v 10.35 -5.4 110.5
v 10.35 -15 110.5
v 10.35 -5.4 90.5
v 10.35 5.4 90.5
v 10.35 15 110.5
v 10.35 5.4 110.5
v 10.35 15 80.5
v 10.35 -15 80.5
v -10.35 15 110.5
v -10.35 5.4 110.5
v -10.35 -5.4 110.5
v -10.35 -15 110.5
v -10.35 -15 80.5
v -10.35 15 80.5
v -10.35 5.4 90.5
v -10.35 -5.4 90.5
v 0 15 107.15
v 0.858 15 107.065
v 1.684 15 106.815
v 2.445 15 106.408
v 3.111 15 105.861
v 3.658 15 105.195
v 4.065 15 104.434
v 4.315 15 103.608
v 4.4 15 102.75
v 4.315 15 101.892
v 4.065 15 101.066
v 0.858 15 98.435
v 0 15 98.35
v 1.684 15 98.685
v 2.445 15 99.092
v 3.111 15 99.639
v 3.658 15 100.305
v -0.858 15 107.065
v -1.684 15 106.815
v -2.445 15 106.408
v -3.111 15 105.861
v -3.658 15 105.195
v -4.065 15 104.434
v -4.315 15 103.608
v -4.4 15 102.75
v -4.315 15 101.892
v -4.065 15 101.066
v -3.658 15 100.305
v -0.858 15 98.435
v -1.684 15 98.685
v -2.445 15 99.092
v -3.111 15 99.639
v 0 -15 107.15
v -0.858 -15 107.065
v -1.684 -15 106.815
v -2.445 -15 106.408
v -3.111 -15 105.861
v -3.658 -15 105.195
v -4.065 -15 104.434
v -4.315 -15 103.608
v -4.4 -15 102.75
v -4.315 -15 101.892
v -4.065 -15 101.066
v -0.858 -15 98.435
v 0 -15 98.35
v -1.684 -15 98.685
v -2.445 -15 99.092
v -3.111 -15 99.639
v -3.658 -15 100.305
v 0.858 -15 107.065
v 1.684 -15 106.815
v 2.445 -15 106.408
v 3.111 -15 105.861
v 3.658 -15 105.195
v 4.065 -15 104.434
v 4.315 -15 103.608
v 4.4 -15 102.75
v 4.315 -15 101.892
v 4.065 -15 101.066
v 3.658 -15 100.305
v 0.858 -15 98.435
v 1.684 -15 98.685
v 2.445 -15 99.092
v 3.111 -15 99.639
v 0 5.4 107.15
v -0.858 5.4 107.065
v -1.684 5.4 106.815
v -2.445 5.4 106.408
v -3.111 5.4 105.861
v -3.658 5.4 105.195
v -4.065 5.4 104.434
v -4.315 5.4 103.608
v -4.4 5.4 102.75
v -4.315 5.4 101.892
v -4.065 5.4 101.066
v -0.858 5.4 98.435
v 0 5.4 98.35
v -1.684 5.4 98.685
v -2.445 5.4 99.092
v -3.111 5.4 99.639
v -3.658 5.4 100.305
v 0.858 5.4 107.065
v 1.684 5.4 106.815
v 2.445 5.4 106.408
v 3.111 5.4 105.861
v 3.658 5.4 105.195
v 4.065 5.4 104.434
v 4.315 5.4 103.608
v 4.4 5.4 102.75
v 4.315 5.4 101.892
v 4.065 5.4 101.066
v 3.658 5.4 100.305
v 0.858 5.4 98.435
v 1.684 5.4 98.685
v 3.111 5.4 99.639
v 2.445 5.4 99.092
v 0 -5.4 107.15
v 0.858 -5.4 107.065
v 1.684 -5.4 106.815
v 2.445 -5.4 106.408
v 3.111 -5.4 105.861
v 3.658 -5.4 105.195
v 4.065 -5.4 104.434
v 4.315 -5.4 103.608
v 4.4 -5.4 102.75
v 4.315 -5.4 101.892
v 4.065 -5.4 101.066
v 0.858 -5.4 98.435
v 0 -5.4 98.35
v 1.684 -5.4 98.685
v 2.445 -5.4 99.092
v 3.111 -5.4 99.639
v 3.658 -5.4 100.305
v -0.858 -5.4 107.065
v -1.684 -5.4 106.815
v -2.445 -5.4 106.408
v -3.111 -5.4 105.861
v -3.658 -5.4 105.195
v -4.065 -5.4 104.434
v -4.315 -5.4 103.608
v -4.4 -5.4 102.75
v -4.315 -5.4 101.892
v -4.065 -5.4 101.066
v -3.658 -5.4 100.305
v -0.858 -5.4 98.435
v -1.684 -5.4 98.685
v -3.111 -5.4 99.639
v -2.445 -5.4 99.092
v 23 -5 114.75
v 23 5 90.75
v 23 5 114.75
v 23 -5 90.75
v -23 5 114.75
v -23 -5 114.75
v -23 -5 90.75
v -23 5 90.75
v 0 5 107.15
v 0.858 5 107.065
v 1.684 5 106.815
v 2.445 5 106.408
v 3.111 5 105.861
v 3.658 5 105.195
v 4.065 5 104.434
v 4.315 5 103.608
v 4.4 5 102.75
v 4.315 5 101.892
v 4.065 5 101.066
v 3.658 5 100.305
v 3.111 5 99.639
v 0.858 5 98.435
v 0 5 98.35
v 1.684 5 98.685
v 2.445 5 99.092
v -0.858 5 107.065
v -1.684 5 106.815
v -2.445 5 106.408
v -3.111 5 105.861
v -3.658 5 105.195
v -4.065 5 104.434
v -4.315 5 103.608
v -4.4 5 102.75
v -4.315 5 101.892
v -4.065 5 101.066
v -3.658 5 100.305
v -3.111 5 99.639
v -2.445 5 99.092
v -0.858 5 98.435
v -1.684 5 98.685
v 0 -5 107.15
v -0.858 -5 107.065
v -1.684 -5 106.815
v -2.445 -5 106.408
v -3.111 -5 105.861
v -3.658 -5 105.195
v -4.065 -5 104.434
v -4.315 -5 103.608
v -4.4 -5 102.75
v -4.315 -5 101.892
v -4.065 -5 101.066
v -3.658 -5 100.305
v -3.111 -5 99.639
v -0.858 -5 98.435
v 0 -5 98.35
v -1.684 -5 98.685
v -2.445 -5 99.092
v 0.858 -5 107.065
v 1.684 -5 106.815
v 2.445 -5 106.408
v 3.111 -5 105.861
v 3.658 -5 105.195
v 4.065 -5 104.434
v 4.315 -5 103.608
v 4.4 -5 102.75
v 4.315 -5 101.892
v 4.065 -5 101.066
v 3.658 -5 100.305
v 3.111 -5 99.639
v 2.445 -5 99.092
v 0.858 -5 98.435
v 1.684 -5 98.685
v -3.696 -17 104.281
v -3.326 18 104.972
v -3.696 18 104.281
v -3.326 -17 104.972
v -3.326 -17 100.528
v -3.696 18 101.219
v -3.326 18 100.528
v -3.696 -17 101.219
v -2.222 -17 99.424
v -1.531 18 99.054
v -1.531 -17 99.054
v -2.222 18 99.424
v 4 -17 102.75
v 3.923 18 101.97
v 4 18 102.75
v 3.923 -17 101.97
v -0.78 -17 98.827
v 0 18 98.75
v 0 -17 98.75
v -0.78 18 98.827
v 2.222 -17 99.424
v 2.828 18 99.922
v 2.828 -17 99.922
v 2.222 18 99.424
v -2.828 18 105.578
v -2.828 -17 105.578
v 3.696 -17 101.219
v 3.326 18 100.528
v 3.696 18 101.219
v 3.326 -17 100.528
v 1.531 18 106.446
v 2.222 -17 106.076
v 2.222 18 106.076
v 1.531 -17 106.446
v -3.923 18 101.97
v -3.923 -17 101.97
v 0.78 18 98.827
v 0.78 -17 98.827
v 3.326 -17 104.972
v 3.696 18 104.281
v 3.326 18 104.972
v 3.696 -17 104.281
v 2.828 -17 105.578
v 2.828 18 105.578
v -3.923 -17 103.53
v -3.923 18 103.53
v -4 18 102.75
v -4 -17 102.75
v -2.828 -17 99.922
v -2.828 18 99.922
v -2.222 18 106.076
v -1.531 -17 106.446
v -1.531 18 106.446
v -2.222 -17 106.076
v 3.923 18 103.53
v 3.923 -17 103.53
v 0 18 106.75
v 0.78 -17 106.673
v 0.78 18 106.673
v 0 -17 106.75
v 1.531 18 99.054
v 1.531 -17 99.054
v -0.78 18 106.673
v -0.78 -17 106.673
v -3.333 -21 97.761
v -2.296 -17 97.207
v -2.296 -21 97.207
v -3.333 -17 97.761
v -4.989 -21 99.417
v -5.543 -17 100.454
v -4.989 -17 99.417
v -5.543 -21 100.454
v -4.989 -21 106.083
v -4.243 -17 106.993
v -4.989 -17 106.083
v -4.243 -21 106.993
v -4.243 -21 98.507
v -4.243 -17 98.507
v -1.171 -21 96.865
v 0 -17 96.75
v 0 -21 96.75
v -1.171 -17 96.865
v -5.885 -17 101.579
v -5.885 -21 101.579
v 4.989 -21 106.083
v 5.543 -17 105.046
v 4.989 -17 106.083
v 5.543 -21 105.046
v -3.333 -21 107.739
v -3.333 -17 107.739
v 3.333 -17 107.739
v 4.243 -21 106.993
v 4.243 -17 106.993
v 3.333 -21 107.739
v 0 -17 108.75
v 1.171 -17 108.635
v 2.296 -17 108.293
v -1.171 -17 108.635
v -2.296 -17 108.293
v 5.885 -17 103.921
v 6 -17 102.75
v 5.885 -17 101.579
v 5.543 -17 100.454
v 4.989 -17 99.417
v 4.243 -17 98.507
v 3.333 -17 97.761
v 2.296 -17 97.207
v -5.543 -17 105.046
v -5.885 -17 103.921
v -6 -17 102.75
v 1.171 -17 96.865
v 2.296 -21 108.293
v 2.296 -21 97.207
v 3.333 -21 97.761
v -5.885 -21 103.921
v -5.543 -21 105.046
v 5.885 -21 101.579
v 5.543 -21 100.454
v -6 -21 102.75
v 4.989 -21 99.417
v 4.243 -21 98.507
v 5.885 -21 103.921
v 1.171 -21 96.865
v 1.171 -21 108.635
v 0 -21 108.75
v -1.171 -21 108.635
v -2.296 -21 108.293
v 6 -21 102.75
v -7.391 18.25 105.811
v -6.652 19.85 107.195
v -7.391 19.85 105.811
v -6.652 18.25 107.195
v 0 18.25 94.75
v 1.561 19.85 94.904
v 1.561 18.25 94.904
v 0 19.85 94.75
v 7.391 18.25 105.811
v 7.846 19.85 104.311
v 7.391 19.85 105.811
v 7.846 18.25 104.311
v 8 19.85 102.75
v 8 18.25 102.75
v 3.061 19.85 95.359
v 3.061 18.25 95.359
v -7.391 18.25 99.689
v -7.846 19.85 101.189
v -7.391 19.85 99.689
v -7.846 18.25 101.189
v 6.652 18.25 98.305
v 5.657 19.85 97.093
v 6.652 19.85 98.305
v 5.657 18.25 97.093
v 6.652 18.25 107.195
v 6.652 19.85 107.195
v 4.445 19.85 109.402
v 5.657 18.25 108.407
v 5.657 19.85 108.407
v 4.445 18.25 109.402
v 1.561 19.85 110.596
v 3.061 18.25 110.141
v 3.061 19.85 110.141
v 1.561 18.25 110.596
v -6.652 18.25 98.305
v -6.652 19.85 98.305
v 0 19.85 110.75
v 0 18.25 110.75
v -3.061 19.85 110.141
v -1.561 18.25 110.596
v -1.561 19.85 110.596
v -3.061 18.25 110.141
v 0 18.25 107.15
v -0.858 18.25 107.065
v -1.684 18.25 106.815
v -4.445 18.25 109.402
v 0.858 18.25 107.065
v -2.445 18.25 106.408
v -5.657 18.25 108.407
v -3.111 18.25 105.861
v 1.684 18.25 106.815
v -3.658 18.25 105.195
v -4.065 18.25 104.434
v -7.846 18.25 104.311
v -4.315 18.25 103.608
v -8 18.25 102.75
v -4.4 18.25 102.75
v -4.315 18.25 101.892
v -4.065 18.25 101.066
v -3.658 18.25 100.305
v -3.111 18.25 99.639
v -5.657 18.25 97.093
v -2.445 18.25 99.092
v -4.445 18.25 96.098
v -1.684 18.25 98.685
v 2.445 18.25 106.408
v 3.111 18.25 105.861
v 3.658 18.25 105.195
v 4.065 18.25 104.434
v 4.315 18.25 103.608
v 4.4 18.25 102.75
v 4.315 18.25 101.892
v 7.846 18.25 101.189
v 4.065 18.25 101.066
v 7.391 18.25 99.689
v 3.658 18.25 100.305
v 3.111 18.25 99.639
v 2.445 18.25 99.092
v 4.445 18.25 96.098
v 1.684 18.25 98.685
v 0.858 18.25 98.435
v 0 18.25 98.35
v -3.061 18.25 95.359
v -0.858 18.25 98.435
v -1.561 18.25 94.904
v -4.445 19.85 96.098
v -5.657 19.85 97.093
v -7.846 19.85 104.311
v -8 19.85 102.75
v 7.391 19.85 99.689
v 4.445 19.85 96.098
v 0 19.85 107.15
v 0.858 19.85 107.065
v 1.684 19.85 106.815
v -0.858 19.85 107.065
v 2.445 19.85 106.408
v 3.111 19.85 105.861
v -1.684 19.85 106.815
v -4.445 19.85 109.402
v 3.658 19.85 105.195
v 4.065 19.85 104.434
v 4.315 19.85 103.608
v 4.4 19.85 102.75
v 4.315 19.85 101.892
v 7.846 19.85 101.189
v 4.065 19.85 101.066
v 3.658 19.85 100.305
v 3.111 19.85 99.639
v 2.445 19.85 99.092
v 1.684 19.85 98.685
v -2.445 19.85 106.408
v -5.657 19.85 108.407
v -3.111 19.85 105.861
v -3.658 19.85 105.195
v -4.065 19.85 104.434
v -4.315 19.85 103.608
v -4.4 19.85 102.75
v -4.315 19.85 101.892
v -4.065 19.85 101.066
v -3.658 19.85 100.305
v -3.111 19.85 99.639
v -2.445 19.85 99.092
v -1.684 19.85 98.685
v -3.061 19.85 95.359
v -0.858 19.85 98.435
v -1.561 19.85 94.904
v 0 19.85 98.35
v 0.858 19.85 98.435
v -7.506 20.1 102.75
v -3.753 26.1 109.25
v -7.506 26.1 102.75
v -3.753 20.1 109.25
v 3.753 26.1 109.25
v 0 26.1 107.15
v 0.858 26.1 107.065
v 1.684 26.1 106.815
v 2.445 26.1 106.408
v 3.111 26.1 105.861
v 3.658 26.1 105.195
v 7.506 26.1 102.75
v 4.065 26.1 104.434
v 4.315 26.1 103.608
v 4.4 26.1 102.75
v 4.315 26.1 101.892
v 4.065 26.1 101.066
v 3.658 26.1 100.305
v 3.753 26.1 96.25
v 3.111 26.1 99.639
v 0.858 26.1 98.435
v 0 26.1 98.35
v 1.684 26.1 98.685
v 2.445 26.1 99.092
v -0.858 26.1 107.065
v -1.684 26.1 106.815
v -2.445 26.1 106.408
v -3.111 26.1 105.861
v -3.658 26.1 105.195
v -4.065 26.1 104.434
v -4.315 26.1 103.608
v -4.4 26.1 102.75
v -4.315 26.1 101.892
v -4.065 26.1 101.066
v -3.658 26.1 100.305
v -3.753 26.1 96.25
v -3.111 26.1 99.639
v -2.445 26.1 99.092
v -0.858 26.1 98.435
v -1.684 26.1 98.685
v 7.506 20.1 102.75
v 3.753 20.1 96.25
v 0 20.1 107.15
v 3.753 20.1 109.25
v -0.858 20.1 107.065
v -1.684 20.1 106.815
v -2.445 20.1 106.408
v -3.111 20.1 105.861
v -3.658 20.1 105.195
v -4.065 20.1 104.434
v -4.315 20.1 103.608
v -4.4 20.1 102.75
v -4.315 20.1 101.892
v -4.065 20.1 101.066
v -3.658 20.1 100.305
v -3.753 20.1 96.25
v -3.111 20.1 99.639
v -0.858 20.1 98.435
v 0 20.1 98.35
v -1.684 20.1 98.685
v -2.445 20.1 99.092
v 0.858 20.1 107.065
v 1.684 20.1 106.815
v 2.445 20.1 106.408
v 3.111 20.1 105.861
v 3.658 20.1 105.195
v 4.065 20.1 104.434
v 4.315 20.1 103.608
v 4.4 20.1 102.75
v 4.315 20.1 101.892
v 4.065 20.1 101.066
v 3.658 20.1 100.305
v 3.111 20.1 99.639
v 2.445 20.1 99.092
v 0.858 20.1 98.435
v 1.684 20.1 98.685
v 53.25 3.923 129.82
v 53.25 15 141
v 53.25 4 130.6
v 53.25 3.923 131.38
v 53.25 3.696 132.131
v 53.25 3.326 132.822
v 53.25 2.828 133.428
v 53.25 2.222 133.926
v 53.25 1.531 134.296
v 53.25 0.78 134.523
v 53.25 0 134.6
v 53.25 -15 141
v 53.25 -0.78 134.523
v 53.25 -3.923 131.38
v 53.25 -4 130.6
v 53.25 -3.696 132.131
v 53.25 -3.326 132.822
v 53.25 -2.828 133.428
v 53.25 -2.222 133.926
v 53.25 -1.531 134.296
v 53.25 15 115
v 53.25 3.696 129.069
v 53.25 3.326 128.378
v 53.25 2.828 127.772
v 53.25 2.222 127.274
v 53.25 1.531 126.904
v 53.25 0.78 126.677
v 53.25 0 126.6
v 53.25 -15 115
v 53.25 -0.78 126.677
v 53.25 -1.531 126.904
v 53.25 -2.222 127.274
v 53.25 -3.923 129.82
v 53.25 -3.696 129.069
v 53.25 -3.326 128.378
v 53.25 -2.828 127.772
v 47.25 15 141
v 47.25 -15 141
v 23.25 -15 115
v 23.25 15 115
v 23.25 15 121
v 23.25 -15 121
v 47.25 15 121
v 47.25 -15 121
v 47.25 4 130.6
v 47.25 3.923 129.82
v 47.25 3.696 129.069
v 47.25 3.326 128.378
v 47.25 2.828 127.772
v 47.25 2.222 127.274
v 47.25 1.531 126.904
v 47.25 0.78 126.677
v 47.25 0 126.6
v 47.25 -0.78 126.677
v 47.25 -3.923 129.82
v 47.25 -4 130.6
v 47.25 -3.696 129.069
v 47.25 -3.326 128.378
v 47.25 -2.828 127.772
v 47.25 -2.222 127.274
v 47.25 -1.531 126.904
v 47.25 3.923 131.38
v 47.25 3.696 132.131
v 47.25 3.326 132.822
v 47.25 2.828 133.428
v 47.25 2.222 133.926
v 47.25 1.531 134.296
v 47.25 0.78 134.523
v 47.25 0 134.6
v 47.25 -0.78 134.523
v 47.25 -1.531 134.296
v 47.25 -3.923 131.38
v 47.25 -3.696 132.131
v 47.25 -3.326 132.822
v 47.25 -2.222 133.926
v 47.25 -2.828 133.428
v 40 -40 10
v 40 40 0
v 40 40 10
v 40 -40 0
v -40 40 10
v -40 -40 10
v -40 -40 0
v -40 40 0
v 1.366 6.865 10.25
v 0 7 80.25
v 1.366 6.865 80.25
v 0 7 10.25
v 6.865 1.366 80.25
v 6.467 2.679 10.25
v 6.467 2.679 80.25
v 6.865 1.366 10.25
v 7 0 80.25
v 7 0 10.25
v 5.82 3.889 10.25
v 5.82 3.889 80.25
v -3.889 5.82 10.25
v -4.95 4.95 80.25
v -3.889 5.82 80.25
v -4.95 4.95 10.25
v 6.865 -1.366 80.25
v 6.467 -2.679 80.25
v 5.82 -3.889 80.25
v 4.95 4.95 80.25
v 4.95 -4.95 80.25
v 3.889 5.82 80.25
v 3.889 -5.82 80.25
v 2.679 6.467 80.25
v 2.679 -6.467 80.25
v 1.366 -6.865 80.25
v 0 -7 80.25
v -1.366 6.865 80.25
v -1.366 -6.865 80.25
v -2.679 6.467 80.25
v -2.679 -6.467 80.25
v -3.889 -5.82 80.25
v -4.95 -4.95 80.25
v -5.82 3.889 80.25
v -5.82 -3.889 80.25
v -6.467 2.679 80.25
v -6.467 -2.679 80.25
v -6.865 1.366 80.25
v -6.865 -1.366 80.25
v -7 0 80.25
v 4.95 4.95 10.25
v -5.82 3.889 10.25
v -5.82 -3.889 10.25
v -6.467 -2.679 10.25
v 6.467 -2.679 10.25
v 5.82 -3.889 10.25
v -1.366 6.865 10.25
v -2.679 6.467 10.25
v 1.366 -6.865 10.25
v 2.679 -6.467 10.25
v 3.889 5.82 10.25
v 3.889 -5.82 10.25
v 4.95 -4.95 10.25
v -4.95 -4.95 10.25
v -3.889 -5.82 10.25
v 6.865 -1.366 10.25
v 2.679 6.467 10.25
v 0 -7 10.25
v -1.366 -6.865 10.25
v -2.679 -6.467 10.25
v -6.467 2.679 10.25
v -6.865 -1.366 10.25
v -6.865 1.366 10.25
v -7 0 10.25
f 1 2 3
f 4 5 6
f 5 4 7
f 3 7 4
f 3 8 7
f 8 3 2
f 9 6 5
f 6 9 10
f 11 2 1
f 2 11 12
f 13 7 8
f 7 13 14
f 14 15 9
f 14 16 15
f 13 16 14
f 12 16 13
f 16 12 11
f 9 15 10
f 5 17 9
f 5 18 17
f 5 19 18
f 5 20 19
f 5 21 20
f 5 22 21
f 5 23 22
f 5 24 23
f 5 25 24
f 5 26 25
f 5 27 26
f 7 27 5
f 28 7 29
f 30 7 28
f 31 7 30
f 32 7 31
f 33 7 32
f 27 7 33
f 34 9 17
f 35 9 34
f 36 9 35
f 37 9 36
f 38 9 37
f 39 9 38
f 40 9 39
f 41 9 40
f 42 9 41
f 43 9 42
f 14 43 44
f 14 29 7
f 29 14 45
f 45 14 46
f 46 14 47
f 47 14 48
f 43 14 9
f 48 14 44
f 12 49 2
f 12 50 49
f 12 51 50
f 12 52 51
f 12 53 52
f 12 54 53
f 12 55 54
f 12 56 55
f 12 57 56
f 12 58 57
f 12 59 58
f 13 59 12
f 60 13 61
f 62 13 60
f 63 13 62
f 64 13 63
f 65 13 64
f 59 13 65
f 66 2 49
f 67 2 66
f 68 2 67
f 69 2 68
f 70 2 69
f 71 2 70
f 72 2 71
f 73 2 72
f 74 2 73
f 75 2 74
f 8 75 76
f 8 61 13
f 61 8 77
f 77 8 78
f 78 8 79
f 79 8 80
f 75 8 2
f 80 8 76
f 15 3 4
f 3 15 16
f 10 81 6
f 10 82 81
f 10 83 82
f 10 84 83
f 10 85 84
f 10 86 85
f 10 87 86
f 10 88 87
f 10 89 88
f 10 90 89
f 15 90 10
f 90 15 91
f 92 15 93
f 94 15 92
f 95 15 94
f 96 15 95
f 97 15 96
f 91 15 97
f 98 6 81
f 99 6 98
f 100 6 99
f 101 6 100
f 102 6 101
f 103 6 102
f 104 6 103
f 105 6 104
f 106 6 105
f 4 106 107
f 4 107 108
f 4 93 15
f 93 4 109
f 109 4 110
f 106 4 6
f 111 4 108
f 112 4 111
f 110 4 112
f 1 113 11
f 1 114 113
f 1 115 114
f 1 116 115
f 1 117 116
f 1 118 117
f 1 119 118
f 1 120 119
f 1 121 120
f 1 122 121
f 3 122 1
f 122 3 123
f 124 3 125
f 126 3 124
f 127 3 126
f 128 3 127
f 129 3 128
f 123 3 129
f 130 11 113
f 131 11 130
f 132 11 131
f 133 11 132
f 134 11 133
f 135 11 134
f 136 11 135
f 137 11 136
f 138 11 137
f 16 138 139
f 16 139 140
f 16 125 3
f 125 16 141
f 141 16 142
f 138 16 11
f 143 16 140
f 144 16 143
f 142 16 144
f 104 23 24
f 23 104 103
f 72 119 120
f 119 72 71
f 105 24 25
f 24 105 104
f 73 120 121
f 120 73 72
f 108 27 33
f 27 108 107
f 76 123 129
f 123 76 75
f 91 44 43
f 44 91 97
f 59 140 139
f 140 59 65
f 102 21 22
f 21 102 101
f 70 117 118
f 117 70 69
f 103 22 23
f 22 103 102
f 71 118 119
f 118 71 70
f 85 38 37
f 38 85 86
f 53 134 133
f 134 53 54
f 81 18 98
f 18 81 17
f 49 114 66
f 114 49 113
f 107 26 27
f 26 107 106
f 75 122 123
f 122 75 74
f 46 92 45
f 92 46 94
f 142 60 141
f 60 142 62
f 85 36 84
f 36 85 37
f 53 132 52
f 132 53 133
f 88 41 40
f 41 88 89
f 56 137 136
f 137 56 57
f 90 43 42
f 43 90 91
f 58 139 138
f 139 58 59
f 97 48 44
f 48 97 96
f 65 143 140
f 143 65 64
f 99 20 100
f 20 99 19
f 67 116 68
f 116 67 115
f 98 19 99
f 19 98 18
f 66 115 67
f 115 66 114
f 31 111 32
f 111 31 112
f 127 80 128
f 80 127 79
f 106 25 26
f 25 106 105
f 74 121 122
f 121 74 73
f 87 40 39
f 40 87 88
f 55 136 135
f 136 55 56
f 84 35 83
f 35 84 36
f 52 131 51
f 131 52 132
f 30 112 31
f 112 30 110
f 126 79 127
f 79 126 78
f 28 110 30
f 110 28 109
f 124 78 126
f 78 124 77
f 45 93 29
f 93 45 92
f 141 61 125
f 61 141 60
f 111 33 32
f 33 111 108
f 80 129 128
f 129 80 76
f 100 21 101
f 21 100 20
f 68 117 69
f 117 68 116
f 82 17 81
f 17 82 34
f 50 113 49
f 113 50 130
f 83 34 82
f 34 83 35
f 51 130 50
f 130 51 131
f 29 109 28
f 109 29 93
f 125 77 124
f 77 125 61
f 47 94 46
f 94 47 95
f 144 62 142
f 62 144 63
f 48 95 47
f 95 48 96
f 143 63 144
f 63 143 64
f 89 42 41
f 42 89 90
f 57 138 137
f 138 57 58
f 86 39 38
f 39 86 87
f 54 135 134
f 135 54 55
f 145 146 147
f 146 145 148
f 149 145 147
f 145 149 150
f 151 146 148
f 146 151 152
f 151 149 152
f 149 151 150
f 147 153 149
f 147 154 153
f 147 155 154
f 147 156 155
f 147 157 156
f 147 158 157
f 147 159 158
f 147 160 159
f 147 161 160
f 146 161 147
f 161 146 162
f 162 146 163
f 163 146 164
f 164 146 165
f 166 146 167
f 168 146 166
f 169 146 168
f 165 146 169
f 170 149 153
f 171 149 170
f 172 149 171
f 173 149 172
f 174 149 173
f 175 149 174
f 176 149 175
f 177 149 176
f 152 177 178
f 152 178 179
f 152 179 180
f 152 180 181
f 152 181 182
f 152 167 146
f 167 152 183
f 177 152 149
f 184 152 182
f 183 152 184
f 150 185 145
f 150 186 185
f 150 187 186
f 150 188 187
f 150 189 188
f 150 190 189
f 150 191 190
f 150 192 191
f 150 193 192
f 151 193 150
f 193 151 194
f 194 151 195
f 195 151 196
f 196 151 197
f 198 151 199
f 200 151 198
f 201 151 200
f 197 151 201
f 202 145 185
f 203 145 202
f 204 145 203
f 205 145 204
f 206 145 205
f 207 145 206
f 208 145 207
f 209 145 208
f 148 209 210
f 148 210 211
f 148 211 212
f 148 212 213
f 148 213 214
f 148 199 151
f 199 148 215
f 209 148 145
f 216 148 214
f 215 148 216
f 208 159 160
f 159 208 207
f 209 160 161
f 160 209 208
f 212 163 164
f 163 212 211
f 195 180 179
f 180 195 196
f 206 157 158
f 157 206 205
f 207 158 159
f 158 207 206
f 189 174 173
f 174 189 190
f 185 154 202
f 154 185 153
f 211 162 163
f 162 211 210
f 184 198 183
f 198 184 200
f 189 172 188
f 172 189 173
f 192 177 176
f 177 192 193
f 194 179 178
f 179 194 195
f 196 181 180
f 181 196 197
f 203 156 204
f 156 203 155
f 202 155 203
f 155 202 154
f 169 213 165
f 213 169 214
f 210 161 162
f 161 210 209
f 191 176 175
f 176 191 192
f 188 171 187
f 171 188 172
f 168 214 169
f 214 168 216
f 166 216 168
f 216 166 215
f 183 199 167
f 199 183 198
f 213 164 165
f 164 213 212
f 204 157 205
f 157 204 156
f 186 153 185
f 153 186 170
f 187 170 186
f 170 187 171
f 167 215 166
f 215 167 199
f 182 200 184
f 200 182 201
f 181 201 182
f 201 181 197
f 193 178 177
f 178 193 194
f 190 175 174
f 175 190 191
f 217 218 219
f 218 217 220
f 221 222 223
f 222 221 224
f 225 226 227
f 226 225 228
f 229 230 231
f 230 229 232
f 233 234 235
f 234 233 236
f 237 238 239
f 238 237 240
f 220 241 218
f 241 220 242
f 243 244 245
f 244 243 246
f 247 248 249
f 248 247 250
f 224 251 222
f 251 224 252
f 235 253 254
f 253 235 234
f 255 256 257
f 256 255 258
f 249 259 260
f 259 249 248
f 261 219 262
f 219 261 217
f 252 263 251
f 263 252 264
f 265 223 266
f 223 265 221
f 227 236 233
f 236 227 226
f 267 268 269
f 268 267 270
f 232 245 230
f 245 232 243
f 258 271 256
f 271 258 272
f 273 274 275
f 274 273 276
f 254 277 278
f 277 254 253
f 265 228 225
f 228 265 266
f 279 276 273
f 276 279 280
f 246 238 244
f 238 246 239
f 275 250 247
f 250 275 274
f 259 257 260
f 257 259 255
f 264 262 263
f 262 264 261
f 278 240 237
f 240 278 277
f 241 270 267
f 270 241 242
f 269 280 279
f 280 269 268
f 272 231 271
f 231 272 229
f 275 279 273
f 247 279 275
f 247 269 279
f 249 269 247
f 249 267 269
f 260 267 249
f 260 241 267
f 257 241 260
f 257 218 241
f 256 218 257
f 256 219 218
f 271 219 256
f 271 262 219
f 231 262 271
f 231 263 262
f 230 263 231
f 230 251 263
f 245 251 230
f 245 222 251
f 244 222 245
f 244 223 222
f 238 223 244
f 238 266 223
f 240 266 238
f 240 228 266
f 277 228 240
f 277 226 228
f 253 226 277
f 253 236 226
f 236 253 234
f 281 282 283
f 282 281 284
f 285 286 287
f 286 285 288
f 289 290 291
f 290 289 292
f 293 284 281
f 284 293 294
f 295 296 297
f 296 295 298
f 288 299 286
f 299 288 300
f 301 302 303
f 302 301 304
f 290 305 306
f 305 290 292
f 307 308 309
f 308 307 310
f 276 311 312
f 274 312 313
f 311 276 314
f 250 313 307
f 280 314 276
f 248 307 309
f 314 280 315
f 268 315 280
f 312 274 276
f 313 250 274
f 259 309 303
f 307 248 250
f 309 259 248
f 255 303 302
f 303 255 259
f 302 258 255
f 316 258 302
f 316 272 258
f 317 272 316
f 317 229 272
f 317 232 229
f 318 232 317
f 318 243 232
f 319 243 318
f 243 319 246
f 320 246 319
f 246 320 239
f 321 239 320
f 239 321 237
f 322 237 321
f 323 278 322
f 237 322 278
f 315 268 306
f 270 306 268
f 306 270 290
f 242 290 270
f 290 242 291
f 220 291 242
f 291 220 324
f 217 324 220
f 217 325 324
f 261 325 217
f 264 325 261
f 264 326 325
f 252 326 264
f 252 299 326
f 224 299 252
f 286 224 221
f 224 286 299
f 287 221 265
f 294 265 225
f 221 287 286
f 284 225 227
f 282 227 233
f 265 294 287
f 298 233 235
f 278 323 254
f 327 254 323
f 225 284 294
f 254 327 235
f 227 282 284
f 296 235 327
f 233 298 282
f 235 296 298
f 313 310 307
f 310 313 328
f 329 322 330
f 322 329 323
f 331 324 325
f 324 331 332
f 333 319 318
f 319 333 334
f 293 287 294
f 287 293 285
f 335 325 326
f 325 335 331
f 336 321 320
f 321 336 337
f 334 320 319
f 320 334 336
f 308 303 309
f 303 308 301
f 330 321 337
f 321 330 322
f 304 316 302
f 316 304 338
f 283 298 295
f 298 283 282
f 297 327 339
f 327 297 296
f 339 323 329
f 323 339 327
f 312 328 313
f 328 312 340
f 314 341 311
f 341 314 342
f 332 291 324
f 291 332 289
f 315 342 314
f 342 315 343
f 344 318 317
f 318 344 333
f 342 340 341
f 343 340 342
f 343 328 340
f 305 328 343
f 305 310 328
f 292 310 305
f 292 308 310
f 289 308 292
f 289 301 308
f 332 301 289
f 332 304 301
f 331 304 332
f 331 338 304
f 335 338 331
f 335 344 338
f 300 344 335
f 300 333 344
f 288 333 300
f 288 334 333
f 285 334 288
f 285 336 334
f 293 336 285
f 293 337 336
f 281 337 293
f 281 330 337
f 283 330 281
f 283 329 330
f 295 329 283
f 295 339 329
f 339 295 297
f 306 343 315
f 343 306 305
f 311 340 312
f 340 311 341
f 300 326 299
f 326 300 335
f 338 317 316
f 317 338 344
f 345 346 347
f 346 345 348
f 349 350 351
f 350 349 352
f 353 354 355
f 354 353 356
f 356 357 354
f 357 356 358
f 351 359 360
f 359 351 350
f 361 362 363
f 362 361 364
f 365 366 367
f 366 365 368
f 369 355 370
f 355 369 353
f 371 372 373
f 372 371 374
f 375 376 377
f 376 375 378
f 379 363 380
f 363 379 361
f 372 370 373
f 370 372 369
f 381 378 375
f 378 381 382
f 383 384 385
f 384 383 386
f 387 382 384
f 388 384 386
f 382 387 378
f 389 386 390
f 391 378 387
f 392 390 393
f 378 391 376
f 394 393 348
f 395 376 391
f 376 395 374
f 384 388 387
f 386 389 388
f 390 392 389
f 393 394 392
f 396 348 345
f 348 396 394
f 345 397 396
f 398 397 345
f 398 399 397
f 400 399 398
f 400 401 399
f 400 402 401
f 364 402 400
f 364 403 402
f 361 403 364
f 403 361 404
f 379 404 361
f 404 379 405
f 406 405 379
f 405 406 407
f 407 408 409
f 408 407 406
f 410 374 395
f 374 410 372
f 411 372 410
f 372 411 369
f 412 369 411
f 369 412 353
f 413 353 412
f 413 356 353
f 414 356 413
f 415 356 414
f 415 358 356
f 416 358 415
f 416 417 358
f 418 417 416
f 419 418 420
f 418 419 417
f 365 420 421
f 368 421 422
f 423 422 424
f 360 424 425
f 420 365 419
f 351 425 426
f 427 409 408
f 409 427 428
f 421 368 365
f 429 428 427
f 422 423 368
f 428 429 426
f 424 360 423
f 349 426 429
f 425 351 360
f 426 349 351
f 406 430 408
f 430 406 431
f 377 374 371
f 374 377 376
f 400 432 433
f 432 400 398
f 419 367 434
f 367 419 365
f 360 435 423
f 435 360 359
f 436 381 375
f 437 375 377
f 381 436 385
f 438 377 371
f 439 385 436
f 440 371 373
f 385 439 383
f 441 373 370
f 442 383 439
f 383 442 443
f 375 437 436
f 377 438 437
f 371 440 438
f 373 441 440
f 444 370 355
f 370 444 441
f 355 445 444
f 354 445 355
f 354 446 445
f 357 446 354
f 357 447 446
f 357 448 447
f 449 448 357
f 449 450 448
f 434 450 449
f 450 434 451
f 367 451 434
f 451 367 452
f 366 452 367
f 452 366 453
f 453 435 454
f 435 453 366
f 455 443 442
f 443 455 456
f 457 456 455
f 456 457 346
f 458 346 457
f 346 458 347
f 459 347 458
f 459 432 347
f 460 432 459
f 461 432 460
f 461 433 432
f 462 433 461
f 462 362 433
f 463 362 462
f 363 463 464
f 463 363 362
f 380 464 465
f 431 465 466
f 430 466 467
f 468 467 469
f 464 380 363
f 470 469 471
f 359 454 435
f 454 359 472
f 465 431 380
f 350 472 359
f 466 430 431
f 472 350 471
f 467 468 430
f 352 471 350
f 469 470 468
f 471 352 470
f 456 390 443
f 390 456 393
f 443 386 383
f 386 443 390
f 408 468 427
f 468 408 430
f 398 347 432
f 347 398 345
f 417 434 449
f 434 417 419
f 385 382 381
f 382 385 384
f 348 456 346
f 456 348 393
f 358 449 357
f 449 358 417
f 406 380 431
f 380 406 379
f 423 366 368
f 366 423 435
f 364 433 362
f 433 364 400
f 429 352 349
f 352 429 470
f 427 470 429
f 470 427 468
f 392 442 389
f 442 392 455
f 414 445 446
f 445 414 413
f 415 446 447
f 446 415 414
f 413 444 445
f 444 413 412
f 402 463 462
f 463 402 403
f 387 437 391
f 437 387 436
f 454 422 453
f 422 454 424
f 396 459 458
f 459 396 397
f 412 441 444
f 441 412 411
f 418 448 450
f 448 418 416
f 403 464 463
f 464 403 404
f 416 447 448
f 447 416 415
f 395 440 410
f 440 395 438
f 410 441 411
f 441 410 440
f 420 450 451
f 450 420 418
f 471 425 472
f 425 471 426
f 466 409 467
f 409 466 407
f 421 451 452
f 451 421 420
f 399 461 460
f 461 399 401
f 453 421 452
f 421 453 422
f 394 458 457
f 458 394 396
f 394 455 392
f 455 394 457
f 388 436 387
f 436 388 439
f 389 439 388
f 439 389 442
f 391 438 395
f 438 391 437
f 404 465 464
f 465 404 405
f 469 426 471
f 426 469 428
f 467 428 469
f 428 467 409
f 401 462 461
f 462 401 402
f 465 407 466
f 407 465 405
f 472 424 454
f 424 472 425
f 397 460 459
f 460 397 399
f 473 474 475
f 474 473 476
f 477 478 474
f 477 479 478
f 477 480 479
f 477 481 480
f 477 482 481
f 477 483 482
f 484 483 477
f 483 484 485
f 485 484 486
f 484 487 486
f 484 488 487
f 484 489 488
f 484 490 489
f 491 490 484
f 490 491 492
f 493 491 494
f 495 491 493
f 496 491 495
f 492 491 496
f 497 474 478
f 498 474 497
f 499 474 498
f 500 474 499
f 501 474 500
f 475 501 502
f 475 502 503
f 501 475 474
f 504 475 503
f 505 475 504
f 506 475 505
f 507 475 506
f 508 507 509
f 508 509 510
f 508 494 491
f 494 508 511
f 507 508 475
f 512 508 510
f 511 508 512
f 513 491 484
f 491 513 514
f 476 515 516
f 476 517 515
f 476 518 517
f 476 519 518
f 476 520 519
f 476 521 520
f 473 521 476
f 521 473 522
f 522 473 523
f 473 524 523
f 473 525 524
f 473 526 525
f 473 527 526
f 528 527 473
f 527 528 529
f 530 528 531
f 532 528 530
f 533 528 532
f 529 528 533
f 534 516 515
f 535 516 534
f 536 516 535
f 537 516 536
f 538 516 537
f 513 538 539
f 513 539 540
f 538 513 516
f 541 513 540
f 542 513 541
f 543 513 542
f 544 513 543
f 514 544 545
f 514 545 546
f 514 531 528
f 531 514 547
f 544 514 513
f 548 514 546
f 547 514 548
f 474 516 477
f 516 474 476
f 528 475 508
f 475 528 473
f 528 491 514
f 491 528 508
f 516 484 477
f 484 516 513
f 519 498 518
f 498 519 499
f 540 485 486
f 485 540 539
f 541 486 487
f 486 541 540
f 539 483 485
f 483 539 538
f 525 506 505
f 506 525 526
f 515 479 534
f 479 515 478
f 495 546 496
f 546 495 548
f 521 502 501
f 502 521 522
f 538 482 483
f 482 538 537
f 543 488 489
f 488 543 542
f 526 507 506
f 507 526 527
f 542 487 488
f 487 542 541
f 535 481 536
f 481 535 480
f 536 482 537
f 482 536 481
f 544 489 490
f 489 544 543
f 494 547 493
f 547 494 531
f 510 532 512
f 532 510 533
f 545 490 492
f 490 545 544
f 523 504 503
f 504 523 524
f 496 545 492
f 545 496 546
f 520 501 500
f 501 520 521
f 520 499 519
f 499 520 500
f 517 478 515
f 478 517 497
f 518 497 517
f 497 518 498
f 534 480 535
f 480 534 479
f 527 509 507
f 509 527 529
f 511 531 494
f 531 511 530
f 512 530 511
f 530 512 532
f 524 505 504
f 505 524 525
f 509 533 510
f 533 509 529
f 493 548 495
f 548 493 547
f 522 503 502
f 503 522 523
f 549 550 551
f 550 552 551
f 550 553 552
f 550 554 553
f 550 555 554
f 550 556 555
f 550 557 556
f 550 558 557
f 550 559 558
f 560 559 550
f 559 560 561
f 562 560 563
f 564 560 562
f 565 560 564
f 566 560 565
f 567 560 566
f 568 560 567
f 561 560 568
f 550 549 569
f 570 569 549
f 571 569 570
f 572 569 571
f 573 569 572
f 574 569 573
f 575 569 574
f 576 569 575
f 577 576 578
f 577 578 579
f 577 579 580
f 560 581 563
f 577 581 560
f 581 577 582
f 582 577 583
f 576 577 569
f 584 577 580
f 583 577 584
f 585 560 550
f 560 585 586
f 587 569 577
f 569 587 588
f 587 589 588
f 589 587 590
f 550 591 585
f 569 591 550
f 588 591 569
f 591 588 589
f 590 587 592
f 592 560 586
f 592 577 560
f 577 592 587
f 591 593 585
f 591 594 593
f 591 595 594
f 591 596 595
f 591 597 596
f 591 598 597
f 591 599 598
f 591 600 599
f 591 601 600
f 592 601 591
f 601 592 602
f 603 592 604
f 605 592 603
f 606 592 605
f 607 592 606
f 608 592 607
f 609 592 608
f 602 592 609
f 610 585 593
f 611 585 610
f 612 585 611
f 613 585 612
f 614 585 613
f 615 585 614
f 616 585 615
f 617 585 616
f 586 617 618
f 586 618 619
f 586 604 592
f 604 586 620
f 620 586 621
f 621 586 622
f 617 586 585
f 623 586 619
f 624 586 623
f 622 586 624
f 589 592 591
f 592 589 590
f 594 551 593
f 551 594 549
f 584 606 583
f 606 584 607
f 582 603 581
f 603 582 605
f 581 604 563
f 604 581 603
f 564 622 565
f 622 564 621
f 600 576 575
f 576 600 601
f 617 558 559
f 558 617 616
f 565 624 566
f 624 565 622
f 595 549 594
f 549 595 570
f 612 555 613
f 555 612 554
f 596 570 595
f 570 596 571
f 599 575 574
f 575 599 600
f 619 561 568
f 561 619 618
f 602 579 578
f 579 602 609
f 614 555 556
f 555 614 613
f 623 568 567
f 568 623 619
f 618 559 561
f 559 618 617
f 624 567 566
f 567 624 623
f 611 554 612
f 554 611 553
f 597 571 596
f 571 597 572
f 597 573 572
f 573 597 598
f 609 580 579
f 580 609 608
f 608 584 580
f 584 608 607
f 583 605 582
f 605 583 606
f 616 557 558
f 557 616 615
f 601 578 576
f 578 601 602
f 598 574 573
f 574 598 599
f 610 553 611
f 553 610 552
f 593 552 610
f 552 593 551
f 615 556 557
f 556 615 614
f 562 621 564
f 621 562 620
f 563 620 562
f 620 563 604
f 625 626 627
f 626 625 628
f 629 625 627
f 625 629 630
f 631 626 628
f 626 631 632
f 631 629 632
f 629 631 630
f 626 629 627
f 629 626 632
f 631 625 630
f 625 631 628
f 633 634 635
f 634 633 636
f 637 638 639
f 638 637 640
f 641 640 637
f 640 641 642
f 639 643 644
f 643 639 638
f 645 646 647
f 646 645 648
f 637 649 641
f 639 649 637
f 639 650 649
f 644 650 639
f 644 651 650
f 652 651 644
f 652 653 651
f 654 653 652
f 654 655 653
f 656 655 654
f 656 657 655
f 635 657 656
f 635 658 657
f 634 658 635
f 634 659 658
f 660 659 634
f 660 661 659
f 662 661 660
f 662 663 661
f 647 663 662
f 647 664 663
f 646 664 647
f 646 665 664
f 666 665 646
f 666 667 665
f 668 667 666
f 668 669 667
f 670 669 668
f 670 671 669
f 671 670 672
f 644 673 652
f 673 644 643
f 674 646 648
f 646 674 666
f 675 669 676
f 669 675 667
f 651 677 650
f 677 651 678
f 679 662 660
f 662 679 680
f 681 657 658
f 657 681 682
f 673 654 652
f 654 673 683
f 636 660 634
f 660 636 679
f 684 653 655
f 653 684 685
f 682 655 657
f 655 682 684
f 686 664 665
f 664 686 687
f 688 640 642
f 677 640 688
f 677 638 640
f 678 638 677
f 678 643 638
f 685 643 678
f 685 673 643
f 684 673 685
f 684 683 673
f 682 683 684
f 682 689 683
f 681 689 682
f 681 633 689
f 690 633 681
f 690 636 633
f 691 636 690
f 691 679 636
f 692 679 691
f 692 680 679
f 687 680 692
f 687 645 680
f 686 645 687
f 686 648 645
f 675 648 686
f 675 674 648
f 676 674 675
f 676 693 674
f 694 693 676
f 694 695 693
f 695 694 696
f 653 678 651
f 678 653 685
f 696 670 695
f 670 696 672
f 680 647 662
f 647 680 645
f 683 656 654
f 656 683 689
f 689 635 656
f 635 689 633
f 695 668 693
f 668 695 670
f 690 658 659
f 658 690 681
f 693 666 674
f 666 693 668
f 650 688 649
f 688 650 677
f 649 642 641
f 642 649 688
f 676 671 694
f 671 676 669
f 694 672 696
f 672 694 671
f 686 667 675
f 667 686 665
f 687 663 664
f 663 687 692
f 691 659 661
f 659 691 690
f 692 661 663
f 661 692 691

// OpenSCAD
$fn = 32;

// ------------------------------------------------------------------------
// Lamp arm: column d14 x 70 mm, arm 46 mm
// Every part is its own module, assembly() places every instance.
// ------------------------------------------------------------------------

// --- part 1 ---
module lamp_base() {
  difference() {
    translate([-40, -40, 0]) cube([80, 80, 10]);
  }
}

// --- part 2 ---
module lamp_column() {
  cylinder(h = 70, d = 14);
}

// --- part 3 ---
module head_fork() {
  difference() {
    translate([-10.35, -15, 0]) cube([20.7, 30, 30]);
    translate([-11.35, -5.4, 10]) cube([22.7, 10.8, 21]);
    translate([0, 0, 22.25]) rotate([90, 0, 0]) cylinder(h = 32, d = 8.8, center = true);
  }
}

// --- part 4 ---
module lamp_arm() {
  difference() {
    translate([-23, -5, 0]) cube([46, 10, 24]);
    translate([0, 0, 12]) rotate([90, 0, 0]) cylinder(h = 12, d = 8.8, center = true);
  }
}

// --- part 5 ---
module arm_pin() {
  rotate([0, 90, 0]) cylinder(h = 36, d = 8, center = true);
  translate([-21, 0, 0]) rotate([0, 90, 0]) cylinder(h = 4, d = 12);
}

// --- part 6 ---
module arm_washer() {
  difference() {
      translate([0, 0, 0]) cylinder(h = 1.6, d = 16);
      translate([0, 0, -1]) cylinder(h = 3.6, d = 8.8);
    }
}

// --- part 7 ---
module arm_nut() {
  difference() {
    linear_extrude(height = 6) polygon(points = [[7.506, 0], [3.753, 6.5], [-3.753, 6.5], [-7.506, 0], [-3.753, -6.5], [3.753, -6.5]]);
    translate([0, 0, -1]) cylinder(h = 8, d = 8.8);
  }
}

// --- part 8 ---
module shade_bracket() {
  difference() {
    translate([-15, -15, 0]) cube([30, 30, 26]);
    translate([-16, -16, 6]) cube([25, 32, 21]);
    translate([12, 0, 15.6]) rotate([0, 90, 0]) cylinder(h = 8, d = 8, center = true);
  }
}

// --- assembly ---
module assembly() {
  color([0.80, 0.24, 0.20]) translate([0, 0, 0]) rotate([0, 0, 0]) lamp_base();
  color([0.20, 0.45, 0.75]) translate([0, 0, 10.25]) rotate([0, 0, 0]) lamp_column();
  color([0.25, 0.62, 0.32]) translate([0, 0, 80.5]) rotate([0, 0, 0]) head_fork();
  color([0.92, 0.70, 0.18]) translate([0, 0, 90.75]) rotate([0, 0, 0]) lamp_arm();
  color([0.58, 0.35, 0.70]) translate([0, 0, 102.75]) rotate([0, 0, 90]) arm_pin();
  color([0.16, 0.66, 0.66]) translate([0, 19.85, 102.75]) rotate([90, 0, 0]) arm_washer();
  color([0.85, 0.48, 0.18]) translate([0, 26.1, 102.75]) rotate([90, 0, 0]) arm_nut();
  color([0.55, 0.60, 0.65]) translate([38.25, 0, 115]) rotate([0, 0, 0]) shade_bracket();
}

assembly();
